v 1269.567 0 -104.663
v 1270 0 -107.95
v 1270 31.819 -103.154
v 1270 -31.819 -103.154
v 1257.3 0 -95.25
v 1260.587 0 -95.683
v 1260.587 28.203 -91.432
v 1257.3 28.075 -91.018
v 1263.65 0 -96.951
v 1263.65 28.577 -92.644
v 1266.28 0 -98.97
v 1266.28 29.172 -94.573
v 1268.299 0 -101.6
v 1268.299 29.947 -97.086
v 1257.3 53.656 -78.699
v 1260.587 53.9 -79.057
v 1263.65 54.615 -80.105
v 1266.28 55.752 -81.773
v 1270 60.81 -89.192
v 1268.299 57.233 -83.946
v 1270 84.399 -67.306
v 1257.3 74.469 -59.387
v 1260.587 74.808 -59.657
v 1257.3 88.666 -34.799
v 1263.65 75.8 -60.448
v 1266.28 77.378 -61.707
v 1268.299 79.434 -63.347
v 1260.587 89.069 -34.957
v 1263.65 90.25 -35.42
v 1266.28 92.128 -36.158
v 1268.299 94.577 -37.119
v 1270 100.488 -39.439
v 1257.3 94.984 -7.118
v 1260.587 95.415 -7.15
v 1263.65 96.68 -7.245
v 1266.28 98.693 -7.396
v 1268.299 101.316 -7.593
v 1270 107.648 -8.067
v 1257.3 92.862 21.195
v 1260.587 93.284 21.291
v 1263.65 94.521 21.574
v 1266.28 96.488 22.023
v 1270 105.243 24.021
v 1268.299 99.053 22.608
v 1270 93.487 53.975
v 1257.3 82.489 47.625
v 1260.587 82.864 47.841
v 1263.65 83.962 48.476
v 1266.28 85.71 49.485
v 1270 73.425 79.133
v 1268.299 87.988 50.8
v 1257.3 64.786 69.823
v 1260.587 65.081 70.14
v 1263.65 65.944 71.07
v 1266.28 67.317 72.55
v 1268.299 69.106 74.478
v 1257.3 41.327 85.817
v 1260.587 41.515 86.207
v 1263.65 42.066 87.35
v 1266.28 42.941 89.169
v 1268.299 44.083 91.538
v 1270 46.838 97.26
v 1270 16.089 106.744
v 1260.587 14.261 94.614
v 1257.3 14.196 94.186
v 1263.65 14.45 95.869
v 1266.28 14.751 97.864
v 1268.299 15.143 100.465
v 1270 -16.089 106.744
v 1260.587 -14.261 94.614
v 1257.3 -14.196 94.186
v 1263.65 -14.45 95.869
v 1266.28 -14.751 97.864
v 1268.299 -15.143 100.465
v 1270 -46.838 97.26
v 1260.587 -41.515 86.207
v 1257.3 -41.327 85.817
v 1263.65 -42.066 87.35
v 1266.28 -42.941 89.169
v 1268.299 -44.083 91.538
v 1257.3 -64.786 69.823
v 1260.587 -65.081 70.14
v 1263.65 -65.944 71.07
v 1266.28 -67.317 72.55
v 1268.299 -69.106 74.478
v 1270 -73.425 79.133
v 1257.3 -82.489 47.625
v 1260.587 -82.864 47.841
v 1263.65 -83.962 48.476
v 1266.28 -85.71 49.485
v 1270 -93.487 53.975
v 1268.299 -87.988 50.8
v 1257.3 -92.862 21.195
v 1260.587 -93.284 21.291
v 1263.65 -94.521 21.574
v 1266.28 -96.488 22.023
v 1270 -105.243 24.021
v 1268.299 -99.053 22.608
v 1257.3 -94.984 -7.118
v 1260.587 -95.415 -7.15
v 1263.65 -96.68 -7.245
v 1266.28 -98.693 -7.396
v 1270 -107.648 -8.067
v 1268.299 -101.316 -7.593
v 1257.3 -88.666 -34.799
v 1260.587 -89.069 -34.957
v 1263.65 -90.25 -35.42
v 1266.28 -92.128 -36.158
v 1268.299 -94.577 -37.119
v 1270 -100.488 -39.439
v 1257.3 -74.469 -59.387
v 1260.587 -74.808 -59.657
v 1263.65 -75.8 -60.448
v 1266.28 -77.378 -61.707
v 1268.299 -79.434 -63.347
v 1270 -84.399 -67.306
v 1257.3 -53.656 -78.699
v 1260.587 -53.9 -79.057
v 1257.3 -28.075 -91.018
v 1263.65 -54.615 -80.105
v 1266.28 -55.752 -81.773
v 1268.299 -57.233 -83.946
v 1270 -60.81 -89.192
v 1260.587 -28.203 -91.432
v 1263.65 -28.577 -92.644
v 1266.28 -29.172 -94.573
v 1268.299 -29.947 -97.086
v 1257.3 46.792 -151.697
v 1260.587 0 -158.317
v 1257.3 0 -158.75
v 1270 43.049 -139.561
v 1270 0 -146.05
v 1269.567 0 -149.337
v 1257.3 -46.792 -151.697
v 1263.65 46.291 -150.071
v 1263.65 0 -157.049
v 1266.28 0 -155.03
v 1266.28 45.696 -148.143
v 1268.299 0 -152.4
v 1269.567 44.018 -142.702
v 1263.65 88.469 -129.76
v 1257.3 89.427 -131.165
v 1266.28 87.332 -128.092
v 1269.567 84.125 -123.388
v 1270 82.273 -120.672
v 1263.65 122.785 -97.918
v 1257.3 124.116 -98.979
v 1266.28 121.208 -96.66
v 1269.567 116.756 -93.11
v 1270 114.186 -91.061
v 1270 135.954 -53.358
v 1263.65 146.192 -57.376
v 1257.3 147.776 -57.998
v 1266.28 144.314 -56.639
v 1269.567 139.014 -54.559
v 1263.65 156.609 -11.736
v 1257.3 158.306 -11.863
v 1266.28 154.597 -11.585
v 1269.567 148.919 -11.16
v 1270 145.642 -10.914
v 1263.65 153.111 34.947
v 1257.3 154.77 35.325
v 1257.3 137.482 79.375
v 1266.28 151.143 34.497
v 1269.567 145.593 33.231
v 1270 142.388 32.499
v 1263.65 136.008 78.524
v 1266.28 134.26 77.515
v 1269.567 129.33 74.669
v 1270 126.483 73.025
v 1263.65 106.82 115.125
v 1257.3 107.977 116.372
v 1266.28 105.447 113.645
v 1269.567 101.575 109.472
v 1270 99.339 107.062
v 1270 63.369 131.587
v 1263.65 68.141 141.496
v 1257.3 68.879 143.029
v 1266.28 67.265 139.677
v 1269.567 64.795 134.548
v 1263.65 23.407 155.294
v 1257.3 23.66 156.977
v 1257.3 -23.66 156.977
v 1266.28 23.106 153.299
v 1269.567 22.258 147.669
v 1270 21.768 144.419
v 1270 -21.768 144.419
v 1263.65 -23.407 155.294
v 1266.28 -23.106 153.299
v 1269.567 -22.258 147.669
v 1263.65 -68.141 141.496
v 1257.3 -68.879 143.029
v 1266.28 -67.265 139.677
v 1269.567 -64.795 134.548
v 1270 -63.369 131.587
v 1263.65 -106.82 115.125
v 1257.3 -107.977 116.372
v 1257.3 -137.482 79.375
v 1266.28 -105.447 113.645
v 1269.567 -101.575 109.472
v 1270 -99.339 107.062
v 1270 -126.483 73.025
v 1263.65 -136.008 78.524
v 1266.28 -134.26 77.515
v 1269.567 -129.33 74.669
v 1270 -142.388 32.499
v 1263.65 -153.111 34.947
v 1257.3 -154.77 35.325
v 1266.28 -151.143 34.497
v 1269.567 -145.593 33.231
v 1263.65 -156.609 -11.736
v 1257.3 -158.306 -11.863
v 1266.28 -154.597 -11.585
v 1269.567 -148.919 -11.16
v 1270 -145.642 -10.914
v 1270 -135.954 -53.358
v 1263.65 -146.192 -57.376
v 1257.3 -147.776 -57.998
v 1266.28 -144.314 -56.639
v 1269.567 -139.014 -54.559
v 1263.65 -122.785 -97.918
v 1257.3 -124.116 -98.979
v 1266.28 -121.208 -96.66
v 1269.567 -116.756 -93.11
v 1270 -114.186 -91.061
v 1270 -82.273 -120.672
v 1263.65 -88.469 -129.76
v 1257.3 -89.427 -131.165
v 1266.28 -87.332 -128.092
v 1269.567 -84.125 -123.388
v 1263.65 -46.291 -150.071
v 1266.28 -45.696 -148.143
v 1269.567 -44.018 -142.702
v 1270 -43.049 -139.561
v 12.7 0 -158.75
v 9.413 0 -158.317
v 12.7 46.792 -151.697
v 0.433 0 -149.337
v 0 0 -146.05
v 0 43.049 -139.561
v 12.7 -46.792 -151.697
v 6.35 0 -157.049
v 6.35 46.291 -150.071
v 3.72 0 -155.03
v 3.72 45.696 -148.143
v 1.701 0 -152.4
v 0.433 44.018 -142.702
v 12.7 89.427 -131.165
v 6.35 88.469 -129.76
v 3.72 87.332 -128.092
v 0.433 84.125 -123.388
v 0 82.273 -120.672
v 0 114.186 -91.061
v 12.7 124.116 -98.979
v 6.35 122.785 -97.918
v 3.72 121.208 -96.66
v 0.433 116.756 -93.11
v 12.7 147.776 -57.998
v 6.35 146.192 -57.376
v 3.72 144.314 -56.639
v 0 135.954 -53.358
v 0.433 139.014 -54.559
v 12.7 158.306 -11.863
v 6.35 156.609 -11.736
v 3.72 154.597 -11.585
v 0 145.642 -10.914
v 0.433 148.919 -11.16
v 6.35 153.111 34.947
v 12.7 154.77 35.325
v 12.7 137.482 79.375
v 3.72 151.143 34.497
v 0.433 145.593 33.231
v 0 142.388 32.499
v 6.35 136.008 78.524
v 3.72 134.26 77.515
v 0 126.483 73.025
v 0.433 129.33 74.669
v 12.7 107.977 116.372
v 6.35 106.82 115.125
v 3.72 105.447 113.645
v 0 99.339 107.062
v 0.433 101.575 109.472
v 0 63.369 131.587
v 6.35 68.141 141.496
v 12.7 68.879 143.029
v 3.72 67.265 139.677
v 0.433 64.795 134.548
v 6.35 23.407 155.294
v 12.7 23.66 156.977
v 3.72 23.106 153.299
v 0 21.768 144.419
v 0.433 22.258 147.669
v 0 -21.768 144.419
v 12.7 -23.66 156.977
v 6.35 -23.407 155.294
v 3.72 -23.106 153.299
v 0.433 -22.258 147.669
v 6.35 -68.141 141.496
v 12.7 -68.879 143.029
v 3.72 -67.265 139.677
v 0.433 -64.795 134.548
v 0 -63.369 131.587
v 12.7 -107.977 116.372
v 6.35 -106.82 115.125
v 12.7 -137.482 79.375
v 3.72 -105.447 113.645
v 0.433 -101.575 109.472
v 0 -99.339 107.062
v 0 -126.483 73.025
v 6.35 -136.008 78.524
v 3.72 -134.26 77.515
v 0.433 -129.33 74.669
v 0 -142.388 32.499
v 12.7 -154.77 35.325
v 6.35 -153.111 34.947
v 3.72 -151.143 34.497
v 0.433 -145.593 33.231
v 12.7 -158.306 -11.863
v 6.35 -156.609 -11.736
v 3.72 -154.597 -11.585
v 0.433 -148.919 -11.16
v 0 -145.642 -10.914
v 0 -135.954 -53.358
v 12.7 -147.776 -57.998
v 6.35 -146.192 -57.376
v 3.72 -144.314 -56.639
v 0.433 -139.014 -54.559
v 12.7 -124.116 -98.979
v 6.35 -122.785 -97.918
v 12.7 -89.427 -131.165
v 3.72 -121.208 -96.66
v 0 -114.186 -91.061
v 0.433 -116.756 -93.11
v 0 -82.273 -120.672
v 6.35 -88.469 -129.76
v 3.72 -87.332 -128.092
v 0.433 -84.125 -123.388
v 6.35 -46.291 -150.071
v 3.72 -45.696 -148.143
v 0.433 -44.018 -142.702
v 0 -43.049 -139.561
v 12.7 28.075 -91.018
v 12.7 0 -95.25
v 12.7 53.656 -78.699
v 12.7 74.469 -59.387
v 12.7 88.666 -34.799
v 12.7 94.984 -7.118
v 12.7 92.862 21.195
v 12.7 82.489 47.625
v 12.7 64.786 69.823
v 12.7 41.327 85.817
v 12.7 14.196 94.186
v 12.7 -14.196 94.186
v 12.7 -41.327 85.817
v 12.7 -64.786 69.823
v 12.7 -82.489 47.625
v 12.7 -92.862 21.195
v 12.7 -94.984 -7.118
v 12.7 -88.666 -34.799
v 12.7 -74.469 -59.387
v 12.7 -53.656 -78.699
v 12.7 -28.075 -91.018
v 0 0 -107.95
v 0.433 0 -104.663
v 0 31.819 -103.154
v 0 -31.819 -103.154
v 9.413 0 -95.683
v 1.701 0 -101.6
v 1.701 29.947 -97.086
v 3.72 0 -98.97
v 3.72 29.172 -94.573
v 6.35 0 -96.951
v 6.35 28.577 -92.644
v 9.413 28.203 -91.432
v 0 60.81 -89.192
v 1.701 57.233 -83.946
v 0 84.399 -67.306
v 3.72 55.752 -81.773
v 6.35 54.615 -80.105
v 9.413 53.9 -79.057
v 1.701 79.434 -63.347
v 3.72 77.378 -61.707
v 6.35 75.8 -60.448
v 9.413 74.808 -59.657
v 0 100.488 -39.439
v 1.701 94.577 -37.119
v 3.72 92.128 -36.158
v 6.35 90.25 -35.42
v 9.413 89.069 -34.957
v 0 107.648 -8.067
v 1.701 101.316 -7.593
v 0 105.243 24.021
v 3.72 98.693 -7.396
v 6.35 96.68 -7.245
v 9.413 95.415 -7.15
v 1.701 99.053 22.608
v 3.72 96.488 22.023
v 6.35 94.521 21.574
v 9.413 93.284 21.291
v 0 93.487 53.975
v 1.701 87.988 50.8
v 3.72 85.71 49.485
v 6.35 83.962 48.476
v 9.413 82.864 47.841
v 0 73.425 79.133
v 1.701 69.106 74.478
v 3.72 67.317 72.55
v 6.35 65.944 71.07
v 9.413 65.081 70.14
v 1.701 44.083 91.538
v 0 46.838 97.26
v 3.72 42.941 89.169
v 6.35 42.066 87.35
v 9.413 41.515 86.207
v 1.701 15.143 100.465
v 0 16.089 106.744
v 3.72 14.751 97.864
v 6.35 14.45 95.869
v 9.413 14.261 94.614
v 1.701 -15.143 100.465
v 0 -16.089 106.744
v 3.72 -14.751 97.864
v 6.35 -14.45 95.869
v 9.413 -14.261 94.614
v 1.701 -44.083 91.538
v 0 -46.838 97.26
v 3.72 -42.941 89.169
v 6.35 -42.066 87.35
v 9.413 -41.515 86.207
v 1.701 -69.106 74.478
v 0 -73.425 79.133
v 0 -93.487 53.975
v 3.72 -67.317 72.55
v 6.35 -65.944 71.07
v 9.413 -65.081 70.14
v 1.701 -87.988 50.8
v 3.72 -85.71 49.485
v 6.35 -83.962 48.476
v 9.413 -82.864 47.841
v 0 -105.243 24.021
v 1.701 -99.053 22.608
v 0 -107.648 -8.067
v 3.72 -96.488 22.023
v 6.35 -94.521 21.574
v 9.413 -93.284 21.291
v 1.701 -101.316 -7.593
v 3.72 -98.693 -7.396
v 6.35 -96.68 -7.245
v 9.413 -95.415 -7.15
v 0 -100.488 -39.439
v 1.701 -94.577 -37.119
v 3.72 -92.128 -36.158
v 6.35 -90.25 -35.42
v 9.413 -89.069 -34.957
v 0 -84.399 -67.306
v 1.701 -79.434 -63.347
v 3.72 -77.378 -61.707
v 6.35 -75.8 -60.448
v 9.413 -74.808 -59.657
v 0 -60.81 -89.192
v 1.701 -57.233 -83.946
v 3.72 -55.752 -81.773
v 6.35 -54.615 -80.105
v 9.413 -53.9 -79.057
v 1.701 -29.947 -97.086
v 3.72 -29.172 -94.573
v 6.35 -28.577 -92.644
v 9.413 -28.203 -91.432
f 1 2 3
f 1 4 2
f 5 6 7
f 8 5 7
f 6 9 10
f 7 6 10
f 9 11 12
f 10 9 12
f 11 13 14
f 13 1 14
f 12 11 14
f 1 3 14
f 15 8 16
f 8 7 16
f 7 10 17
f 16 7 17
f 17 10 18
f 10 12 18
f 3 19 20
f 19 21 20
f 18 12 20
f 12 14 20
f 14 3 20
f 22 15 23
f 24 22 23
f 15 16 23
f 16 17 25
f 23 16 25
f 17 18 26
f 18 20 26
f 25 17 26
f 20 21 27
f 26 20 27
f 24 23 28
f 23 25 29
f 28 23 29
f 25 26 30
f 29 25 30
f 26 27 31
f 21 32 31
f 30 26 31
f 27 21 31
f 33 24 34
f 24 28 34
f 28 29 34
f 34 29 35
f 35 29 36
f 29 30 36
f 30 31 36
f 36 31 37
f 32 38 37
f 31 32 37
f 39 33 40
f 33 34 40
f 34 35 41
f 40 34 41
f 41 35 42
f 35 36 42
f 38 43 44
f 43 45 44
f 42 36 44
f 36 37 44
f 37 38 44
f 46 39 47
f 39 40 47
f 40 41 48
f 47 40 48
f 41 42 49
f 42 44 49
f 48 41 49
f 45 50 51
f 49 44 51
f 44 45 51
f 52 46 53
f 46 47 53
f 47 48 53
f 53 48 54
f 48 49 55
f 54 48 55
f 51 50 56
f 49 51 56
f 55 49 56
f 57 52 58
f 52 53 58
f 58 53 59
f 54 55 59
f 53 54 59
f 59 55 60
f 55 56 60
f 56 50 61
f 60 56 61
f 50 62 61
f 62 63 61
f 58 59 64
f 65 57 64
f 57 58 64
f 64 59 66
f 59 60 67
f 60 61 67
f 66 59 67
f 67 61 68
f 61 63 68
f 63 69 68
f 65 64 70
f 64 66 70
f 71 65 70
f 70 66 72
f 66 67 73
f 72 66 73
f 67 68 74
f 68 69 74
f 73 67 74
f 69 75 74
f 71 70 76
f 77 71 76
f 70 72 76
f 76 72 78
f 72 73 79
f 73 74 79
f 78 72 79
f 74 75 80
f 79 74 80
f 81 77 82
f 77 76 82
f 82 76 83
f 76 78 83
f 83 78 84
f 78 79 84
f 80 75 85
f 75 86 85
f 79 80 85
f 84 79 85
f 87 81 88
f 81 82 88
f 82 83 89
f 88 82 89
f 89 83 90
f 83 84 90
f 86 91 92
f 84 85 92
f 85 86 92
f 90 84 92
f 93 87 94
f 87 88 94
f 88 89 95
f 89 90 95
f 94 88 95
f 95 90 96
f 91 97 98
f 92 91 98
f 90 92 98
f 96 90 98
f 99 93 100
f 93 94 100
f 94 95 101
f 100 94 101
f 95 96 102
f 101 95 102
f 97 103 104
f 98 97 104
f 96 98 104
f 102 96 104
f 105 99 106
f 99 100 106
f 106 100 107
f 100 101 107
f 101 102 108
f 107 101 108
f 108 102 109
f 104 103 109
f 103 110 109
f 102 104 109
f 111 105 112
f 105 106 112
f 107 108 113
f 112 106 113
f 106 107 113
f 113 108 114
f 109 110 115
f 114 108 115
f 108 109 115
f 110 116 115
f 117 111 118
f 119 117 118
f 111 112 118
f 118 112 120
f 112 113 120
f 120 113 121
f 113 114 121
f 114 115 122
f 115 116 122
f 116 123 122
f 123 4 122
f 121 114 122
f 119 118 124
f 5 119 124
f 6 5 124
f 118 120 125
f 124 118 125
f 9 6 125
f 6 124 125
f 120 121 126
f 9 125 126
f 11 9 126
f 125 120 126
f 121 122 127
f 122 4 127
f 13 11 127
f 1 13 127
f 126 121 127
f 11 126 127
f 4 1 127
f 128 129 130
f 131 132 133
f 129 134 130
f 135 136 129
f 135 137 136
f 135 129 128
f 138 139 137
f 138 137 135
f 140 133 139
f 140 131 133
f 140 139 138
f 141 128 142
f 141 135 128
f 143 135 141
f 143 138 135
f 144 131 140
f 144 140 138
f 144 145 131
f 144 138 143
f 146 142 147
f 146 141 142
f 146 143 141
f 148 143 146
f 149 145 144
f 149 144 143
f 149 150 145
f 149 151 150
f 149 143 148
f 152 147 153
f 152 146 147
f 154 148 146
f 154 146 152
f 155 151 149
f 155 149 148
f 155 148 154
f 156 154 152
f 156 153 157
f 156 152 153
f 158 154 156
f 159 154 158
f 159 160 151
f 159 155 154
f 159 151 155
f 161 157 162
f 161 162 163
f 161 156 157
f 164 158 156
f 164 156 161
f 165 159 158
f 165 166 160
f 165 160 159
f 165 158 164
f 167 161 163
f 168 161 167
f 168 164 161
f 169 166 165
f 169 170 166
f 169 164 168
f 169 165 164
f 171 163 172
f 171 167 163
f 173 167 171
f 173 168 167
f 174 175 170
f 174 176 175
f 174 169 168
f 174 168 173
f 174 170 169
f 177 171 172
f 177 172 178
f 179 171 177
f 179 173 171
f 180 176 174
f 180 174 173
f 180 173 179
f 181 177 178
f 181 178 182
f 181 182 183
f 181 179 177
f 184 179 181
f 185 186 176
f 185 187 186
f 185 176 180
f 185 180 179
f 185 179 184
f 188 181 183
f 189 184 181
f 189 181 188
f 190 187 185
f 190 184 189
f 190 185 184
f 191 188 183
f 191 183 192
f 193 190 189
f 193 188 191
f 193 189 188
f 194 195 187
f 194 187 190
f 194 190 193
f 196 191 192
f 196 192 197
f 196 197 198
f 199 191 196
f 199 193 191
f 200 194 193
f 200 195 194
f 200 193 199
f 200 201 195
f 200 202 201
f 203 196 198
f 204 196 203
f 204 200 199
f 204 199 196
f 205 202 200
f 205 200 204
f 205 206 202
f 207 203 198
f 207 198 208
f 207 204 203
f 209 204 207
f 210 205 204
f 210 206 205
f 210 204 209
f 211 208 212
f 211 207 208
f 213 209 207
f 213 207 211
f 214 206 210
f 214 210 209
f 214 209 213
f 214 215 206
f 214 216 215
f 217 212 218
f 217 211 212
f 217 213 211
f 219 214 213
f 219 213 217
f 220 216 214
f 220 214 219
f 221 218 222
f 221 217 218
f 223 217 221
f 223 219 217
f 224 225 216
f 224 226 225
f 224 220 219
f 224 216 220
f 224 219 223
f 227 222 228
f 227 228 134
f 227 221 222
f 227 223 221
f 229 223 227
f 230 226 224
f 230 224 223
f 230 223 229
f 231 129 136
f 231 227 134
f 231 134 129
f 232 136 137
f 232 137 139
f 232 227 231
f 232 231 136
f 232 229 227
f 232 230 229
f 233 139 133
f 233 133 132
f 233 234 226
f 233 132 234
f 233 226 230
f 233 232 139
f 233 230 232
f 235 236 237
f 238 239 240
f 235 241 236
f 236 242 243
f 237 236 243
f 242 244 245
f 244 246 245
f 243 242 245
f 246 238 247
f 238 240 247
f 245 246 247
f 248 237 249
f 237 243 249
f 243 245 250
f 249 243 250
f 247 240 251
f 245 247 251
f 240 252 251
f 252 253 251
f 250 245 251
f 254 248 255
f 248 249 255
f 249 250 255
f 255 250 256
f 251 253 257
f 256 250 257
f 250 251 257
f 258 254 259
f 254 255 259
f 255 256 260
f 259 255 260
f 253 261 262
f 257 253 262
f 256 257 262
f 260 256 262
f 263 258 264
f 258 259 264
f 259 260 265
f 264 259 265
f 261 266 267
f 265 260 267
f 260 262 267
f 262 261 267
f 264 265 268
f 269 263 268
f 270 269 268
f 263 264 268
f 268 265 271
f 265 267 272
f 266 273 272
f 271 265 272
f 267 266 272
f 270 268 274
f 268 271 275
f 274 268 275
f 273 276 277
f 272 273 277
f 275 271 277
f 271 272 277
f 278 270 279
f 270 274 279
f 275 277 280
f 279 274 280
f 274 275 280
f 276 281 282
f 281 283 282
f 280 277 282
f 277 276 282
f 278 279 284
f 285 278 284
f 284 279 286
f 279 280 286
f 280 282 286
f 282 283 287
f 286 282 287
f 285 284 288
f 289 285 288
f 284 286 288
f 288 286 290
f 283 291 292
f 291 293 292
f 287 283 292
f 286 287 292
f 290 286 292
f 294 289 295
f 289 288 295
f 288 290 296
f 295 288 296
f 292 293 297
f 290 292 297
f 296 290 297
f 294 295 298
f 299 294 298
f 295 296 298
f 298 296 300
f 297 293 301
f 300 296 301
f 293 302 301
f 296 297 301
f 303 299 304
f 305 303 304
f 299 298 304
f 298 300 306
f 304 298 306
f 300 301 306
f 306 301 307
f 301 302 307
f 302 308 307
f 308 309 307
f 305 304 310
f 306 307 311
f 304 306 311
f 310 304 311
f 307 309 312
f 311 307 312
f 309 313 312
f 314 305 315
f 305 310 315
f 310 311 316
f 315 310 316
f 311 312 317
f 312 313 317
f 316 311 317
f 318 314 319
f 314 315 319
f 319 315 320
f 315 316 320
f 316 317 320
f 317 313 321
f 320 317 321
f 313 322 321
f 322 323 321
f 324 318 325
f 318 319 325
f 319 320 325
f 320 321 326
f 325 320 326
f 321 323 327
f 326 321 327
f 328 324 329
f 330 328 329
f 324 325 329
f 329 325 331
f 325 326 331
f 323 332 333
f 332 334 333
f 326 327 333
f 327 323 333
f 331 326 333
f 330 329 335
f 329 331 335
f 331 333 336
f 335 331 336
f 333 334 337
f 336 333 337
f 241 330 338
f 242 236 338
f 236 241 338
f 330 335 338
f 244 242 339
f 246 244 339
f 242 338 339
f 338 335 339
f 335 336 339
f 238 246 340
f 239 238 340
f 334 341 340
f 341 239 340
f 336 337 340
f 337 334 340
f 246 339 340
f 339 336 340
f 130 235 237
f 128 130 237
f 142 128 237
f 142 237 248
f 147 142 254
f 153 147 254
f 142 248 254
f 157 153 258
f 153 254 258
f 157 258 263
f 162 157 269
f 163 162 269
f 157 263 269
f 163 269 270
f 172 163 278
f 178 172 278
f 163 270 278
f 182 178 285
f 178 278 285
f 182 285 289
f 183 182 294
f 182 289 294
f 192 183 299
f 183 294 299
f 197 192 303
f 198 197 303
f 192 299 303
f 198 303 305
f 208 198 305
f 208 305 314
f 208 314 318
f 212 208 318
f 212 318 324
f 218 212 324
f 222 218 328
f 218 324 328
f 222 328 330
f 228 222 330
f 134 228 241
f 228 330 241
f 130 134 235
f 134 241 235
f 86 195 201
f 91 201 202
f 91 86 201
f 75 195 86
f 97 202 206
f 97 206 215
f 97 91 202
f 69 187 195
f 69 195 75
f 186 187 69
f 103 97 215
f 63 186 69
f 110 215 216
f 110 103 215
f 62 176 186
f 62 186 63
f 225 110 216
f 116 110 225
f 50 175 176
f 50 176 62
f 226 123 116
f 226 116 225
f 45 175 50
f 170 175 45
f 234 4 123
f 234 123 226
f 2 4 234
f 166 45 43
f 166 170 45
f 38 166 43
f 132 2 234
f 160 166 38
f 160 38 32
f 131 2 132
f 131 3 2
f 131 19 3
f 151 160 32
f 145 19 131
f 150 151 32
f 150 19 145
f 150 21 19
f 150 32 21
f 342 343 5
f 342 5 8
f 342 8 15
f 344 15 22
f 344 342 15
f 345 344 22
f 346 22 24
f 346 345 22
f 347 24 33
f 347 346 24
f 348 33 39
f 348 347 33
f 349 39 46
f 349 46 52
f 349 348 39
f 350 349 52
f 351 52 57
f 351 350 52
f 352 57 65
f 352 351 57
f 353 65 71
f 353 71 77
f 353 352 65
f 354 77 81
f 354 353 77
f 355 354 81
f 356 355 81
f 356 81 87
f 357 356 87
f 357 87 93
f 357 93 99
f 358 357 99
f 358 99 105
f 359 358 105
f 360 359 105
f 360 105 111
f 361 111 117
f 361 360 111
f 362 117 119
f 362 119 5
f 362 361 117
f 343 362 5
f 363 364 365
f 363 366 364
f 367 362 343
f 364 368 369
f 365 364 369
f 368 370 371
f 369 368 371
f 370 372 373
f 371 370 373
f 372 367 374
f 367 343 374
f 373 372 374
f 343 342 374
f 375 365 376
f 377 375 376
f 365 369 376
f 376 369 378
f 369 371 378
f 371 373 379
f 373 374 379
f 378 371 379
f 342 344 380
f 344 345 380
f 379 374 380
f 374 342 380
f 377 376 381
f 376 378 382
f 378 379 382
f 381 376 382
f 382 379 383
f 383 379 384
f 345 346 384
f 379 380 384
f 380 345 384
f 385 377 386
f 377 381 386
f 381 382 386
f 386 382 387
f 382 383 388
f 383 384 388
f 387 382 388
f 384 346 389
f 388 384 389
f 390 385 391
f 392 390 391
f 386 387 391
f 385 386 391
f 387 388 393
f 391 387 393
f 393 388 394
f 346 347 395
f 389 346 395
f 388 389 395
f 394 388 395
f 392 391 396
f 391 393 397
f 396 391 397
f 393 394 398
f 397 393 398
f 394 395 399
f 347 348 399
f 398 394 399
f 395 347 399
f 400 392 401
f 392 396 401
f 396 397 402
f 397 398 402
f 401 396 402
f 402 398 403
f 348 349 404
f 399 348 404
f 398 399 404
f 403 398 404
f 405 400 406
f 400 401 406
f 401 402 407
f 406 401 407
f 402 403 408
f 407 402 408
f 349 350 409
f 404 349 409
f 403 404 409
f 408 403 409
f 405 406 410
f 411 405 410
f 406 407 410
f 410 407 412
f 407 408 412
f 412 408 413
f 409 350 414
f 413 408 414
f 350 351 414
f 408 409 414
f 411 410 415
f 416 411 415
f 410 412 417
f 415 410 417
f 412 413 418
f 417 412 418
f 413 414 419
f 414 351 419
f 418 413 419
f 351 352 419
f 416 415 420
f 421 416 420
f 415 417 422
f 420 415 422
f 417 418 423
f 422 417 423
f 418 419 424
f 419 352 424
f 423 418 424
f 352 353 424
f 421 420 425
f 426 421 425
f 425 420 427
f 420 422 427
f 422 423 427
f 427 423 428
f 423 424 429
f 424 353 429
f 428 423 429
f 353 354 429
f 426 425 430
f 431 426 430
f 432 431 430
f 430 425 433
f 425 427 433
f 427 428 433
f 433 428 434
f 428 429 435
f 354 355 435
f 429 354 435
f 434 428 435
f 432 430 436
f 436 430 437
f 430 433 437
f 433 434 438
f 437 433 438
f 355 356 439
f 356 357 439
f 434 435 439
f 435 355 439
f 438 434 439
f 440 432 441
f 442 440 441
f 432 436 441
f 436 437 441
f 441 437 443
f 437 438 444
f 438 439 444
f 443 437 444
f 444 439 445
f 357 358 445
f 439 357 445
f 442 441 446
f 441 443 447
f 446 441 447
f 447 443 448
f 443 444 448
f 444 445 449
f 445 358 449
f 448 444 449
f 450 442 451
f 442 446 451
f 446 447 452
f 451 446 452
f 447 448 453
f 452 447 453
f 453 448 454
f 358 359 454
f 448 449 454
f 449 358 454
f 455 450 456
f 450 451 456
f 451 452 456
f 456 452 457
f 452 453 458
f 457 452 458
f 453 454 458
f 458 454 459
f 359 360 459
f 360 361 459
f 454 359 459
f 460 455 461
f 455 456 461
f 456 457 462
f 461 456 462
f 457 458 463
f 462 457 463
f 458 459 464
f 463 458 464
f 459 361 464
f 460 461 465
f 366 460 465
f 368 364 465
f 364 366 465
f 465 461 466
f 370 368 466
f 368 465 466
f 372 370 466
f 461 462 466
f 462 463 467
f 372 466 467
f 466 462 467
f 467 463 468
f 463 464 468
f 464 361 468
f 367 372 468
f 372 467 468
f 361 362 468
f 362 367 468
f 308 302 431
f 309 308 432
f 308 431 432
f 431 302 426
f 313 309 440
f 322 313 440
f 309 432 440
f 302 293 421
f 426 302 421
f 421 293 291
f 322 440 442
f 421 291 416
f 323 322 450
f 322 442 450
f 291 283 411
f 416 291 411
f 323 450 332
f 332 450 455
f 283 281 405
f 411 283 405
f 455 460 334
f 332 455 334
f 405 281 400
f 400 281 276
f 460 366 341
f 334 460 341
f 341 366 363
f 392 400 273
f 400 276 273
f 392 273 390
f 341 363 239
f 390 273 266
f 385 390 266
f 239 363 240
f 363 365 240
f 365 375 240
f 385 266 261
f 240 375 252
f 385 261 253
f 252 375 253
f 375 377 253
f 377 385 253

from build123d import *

# Parameters (mm, degrees)
SKETCH1_R           = 158.75
SKETCH1_R_2         = 95.25
BOSS_EXTRUDE1_DEPTH = 1270
FILLET1_R           = 12.7
FILLET2_R           = 12.7


with BuildPart() as part:
    # Sketch1 → Boss-Extrude1 (new body)
    with BuildSketch(Plane(origin=(0, 0, 0), x_dir=(0, 0, -1), z_dir=(1, 0, 0))):
        Circle(SKETCH1_R)
        Circle(SKETCH1_R_2, mode=Mode.SUBTRACT)
    extrude(amount=BOSS_EXTRUDE1_DEPTH)

    # Fillet1
    fillet1_edges = [part.edges().sort_by_distance(p)[0] for p in [
        (1270, 0, 158.75),
        (1270, 0, 95.25),
    ]]
    fillet(fillet1_edges, radius=FILLET1_R)

    # Fillet2
    fillet2_edges = [part.edges().sort_by_distance(p)[0] for p in [
        (0, 0, 158.75),
        (0, 0, 95.25),
    ]]
    fillet(fillet2_edges, radius=FILLET2_R)


solid = part.part
